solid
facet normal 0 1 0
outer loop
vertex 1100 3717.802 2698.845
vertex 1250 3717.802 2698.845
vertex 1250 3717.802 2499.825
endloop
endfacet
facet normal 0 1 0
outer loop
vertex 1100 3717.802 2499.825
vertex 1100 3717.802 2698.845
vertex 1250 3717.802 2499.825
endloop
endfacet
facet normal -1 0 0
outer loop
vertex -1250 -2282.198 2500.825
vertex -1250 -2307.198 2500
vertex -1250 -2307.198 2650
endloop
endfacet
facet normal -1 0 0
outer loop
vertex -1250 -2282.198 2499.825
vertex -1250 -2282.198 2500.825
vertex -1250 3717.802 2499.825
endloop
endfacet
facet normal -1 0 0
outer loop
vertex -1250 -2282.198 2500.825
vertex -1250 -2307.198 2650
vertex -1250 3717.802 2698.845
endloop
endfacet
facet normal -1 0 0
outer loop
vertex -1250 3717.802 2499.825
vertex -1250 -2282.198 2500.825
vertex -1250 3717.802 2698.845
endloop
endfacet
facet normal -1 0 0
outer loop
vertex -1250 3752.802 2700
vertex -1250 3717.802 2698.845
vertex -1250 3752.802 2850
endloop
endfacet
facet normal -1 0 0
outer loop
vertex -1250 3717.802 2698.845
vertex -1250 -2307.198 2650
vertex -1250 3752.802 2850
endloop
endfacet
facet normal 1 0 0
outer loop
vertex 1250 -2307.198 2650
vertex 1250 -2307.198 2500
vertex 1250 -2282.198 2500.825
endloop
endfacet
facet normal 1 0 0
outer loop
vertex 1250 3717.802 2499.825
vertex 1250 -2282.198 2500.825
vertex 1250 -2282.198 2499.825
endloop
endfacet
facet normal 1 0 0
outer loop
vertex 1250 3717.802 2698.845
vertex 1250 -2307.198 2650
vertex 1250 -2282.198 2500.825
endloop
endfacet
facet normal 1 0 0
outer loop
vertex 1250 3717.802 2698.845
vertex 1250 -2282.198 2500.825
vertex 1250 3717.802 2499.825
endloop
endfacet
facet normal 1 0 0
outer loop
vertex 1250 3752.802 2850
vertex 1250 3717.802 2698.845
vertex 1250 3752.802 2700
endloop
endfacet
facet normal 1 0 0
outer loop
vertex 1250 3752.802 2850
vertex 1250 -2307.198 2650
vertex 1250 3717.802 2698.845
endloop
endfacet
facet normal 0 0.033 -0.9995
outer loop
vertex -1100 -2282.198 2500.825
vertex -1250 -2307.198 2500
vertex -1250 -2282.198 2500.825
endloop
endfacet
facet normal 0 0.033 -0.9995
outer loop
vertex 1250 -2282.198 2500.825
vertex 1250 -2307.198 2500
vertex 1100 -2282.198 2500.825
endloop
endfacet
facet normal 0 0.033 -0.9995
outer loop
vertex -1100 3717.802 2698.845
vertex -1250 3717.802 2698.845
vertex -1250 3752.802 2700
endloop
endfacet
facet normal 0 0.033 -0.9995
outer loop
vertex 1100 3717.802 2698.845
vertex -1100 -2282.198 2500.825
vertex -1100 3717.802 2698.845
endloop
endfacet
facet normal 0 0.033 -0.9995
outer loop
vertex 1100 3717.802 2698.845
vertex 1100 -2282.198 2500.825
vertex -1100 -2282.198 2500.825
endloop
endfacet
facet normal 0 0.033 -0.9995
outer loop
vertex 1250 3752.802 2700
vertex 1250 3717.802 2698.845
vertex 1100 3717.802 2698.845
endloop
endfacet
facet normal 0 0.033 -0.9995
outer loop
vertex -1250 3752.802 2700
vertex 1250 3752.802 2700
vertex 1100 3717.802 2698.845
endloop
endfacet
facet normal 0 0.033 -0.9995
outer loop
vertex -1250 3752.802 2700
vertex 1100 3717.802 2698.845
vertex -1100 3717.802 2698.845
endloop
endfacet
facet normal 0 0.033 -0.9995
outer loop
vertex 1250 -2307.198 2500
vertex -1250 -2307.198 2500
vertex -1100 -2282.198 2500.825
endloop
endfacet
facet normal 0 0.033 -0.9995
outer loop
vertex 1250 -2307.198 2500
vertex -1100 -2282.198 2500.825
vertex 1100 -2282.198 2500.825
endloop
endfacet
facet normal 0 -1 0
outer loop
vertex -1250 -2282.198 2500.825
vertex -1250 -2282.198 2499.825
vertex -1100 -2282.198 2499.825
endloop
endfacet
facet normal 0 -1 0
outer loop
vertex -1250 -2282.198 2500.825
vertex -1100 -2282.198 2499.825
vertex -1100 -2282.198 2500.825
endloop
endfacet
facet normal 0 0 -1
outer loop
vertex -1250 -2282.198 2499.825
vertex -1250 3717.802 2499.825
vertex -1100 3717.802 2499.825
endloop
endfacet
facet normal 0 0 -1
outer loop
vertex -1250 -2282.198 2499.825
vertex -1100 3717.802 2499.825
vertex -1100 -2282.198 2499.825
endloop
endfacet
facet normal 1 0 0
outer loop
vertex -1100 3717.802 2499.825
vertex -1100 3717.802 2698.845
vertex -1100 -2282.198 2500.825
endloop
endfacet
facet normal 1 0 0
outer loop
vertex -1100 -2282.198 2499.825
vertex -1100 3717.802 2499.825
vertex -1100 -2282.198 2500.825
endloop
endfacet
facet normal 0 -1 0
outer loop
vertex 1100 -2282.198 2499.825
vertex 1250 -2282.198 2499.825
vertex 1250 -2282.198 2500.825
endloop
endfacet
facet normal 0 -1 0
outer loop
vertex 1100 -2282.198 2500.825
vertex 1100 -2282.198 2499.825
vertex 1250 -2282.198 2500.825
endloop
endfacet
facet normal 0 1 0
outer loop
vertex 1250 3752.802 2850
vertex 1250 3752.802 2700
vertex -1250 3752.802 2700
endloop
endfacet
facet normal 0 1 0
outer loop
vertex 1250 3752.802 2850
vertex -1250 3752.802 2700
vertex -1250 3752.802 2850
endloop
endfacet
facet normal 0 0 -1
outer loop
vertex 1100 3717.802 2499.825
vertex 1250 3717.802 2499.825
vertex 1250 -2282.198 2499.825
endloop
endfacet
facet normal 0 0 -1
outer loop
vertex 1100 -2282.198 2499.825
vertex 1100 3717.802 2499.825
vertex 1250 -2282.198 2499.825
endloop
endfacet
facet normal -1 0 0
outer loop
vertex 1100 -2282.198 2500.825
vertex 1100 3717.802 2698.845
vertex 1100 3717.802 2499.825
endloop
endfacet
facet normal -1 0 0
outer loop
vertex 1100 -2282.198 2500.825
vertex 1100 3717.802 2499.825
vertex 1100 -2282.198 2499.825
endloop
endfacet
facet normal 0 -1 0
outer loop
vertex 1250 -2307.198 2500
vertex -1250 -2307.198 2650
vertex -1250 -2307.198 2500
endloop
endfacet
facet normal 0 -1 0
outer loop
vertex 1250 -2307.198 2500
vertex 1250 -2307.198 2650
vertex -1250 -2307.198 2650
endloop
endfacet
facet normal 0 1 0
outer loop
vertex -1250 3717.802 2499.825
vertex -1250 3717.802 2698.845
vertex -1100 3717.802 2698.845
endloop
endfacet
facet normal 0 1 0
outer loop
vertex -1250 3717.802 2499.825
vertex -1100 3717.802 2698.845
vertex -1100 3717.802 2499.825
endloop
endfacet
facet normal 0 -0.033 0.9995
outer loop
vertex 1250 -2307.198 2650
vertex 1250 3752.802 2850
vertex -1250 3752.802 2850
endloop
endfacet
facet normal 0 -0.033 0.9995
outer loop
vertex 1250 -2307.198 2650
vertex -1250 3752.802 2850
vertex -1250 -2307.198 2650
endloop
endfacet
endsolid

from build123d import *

# Parameters (mm, degrees)
PAD006_DEPTH = 1250
PAD007_DEPTH = 150


with BuildPart() as pad007:
    # Sketch015 → Pad006 (new body)
    with BuildSketch(Plane.YZ):
        Polygon((-2307.198486, 2500), (3752.801514, 2700), (3752.801514, 2850), (-2307.198486, 2650), align=None)
    extrude(amount=PAD006_DEPTH)

    # Sketch016 → Pad007 (new body)
    with BuildSketch(Plane.YZ.offset(1250)):
        Polygon((-2282.198486, 2500.8250825082), (3717.801514, 2698.8448844884), (3717.801514, 2499.8250825082), (-2282.198486, 2499.8250825082), align=None)
    extrude(amount=-PAD007_DEPTH)


with BuildPart() as part_mirroring:
    # Part__Mirroring: instance of Pad007
    add(pad007.part.mirror(Plane(origin=(0, 0, 0), x_dir=(0, -1, 0), z_dir=(1, 0, 0))))


with BuildPart() as roof:
    # Fusion base: copy of Pad007
    add(pad007.part)

    # Fusion: union Part__Mirroring
    add(part_mirroring.part)


solid = roof.part
